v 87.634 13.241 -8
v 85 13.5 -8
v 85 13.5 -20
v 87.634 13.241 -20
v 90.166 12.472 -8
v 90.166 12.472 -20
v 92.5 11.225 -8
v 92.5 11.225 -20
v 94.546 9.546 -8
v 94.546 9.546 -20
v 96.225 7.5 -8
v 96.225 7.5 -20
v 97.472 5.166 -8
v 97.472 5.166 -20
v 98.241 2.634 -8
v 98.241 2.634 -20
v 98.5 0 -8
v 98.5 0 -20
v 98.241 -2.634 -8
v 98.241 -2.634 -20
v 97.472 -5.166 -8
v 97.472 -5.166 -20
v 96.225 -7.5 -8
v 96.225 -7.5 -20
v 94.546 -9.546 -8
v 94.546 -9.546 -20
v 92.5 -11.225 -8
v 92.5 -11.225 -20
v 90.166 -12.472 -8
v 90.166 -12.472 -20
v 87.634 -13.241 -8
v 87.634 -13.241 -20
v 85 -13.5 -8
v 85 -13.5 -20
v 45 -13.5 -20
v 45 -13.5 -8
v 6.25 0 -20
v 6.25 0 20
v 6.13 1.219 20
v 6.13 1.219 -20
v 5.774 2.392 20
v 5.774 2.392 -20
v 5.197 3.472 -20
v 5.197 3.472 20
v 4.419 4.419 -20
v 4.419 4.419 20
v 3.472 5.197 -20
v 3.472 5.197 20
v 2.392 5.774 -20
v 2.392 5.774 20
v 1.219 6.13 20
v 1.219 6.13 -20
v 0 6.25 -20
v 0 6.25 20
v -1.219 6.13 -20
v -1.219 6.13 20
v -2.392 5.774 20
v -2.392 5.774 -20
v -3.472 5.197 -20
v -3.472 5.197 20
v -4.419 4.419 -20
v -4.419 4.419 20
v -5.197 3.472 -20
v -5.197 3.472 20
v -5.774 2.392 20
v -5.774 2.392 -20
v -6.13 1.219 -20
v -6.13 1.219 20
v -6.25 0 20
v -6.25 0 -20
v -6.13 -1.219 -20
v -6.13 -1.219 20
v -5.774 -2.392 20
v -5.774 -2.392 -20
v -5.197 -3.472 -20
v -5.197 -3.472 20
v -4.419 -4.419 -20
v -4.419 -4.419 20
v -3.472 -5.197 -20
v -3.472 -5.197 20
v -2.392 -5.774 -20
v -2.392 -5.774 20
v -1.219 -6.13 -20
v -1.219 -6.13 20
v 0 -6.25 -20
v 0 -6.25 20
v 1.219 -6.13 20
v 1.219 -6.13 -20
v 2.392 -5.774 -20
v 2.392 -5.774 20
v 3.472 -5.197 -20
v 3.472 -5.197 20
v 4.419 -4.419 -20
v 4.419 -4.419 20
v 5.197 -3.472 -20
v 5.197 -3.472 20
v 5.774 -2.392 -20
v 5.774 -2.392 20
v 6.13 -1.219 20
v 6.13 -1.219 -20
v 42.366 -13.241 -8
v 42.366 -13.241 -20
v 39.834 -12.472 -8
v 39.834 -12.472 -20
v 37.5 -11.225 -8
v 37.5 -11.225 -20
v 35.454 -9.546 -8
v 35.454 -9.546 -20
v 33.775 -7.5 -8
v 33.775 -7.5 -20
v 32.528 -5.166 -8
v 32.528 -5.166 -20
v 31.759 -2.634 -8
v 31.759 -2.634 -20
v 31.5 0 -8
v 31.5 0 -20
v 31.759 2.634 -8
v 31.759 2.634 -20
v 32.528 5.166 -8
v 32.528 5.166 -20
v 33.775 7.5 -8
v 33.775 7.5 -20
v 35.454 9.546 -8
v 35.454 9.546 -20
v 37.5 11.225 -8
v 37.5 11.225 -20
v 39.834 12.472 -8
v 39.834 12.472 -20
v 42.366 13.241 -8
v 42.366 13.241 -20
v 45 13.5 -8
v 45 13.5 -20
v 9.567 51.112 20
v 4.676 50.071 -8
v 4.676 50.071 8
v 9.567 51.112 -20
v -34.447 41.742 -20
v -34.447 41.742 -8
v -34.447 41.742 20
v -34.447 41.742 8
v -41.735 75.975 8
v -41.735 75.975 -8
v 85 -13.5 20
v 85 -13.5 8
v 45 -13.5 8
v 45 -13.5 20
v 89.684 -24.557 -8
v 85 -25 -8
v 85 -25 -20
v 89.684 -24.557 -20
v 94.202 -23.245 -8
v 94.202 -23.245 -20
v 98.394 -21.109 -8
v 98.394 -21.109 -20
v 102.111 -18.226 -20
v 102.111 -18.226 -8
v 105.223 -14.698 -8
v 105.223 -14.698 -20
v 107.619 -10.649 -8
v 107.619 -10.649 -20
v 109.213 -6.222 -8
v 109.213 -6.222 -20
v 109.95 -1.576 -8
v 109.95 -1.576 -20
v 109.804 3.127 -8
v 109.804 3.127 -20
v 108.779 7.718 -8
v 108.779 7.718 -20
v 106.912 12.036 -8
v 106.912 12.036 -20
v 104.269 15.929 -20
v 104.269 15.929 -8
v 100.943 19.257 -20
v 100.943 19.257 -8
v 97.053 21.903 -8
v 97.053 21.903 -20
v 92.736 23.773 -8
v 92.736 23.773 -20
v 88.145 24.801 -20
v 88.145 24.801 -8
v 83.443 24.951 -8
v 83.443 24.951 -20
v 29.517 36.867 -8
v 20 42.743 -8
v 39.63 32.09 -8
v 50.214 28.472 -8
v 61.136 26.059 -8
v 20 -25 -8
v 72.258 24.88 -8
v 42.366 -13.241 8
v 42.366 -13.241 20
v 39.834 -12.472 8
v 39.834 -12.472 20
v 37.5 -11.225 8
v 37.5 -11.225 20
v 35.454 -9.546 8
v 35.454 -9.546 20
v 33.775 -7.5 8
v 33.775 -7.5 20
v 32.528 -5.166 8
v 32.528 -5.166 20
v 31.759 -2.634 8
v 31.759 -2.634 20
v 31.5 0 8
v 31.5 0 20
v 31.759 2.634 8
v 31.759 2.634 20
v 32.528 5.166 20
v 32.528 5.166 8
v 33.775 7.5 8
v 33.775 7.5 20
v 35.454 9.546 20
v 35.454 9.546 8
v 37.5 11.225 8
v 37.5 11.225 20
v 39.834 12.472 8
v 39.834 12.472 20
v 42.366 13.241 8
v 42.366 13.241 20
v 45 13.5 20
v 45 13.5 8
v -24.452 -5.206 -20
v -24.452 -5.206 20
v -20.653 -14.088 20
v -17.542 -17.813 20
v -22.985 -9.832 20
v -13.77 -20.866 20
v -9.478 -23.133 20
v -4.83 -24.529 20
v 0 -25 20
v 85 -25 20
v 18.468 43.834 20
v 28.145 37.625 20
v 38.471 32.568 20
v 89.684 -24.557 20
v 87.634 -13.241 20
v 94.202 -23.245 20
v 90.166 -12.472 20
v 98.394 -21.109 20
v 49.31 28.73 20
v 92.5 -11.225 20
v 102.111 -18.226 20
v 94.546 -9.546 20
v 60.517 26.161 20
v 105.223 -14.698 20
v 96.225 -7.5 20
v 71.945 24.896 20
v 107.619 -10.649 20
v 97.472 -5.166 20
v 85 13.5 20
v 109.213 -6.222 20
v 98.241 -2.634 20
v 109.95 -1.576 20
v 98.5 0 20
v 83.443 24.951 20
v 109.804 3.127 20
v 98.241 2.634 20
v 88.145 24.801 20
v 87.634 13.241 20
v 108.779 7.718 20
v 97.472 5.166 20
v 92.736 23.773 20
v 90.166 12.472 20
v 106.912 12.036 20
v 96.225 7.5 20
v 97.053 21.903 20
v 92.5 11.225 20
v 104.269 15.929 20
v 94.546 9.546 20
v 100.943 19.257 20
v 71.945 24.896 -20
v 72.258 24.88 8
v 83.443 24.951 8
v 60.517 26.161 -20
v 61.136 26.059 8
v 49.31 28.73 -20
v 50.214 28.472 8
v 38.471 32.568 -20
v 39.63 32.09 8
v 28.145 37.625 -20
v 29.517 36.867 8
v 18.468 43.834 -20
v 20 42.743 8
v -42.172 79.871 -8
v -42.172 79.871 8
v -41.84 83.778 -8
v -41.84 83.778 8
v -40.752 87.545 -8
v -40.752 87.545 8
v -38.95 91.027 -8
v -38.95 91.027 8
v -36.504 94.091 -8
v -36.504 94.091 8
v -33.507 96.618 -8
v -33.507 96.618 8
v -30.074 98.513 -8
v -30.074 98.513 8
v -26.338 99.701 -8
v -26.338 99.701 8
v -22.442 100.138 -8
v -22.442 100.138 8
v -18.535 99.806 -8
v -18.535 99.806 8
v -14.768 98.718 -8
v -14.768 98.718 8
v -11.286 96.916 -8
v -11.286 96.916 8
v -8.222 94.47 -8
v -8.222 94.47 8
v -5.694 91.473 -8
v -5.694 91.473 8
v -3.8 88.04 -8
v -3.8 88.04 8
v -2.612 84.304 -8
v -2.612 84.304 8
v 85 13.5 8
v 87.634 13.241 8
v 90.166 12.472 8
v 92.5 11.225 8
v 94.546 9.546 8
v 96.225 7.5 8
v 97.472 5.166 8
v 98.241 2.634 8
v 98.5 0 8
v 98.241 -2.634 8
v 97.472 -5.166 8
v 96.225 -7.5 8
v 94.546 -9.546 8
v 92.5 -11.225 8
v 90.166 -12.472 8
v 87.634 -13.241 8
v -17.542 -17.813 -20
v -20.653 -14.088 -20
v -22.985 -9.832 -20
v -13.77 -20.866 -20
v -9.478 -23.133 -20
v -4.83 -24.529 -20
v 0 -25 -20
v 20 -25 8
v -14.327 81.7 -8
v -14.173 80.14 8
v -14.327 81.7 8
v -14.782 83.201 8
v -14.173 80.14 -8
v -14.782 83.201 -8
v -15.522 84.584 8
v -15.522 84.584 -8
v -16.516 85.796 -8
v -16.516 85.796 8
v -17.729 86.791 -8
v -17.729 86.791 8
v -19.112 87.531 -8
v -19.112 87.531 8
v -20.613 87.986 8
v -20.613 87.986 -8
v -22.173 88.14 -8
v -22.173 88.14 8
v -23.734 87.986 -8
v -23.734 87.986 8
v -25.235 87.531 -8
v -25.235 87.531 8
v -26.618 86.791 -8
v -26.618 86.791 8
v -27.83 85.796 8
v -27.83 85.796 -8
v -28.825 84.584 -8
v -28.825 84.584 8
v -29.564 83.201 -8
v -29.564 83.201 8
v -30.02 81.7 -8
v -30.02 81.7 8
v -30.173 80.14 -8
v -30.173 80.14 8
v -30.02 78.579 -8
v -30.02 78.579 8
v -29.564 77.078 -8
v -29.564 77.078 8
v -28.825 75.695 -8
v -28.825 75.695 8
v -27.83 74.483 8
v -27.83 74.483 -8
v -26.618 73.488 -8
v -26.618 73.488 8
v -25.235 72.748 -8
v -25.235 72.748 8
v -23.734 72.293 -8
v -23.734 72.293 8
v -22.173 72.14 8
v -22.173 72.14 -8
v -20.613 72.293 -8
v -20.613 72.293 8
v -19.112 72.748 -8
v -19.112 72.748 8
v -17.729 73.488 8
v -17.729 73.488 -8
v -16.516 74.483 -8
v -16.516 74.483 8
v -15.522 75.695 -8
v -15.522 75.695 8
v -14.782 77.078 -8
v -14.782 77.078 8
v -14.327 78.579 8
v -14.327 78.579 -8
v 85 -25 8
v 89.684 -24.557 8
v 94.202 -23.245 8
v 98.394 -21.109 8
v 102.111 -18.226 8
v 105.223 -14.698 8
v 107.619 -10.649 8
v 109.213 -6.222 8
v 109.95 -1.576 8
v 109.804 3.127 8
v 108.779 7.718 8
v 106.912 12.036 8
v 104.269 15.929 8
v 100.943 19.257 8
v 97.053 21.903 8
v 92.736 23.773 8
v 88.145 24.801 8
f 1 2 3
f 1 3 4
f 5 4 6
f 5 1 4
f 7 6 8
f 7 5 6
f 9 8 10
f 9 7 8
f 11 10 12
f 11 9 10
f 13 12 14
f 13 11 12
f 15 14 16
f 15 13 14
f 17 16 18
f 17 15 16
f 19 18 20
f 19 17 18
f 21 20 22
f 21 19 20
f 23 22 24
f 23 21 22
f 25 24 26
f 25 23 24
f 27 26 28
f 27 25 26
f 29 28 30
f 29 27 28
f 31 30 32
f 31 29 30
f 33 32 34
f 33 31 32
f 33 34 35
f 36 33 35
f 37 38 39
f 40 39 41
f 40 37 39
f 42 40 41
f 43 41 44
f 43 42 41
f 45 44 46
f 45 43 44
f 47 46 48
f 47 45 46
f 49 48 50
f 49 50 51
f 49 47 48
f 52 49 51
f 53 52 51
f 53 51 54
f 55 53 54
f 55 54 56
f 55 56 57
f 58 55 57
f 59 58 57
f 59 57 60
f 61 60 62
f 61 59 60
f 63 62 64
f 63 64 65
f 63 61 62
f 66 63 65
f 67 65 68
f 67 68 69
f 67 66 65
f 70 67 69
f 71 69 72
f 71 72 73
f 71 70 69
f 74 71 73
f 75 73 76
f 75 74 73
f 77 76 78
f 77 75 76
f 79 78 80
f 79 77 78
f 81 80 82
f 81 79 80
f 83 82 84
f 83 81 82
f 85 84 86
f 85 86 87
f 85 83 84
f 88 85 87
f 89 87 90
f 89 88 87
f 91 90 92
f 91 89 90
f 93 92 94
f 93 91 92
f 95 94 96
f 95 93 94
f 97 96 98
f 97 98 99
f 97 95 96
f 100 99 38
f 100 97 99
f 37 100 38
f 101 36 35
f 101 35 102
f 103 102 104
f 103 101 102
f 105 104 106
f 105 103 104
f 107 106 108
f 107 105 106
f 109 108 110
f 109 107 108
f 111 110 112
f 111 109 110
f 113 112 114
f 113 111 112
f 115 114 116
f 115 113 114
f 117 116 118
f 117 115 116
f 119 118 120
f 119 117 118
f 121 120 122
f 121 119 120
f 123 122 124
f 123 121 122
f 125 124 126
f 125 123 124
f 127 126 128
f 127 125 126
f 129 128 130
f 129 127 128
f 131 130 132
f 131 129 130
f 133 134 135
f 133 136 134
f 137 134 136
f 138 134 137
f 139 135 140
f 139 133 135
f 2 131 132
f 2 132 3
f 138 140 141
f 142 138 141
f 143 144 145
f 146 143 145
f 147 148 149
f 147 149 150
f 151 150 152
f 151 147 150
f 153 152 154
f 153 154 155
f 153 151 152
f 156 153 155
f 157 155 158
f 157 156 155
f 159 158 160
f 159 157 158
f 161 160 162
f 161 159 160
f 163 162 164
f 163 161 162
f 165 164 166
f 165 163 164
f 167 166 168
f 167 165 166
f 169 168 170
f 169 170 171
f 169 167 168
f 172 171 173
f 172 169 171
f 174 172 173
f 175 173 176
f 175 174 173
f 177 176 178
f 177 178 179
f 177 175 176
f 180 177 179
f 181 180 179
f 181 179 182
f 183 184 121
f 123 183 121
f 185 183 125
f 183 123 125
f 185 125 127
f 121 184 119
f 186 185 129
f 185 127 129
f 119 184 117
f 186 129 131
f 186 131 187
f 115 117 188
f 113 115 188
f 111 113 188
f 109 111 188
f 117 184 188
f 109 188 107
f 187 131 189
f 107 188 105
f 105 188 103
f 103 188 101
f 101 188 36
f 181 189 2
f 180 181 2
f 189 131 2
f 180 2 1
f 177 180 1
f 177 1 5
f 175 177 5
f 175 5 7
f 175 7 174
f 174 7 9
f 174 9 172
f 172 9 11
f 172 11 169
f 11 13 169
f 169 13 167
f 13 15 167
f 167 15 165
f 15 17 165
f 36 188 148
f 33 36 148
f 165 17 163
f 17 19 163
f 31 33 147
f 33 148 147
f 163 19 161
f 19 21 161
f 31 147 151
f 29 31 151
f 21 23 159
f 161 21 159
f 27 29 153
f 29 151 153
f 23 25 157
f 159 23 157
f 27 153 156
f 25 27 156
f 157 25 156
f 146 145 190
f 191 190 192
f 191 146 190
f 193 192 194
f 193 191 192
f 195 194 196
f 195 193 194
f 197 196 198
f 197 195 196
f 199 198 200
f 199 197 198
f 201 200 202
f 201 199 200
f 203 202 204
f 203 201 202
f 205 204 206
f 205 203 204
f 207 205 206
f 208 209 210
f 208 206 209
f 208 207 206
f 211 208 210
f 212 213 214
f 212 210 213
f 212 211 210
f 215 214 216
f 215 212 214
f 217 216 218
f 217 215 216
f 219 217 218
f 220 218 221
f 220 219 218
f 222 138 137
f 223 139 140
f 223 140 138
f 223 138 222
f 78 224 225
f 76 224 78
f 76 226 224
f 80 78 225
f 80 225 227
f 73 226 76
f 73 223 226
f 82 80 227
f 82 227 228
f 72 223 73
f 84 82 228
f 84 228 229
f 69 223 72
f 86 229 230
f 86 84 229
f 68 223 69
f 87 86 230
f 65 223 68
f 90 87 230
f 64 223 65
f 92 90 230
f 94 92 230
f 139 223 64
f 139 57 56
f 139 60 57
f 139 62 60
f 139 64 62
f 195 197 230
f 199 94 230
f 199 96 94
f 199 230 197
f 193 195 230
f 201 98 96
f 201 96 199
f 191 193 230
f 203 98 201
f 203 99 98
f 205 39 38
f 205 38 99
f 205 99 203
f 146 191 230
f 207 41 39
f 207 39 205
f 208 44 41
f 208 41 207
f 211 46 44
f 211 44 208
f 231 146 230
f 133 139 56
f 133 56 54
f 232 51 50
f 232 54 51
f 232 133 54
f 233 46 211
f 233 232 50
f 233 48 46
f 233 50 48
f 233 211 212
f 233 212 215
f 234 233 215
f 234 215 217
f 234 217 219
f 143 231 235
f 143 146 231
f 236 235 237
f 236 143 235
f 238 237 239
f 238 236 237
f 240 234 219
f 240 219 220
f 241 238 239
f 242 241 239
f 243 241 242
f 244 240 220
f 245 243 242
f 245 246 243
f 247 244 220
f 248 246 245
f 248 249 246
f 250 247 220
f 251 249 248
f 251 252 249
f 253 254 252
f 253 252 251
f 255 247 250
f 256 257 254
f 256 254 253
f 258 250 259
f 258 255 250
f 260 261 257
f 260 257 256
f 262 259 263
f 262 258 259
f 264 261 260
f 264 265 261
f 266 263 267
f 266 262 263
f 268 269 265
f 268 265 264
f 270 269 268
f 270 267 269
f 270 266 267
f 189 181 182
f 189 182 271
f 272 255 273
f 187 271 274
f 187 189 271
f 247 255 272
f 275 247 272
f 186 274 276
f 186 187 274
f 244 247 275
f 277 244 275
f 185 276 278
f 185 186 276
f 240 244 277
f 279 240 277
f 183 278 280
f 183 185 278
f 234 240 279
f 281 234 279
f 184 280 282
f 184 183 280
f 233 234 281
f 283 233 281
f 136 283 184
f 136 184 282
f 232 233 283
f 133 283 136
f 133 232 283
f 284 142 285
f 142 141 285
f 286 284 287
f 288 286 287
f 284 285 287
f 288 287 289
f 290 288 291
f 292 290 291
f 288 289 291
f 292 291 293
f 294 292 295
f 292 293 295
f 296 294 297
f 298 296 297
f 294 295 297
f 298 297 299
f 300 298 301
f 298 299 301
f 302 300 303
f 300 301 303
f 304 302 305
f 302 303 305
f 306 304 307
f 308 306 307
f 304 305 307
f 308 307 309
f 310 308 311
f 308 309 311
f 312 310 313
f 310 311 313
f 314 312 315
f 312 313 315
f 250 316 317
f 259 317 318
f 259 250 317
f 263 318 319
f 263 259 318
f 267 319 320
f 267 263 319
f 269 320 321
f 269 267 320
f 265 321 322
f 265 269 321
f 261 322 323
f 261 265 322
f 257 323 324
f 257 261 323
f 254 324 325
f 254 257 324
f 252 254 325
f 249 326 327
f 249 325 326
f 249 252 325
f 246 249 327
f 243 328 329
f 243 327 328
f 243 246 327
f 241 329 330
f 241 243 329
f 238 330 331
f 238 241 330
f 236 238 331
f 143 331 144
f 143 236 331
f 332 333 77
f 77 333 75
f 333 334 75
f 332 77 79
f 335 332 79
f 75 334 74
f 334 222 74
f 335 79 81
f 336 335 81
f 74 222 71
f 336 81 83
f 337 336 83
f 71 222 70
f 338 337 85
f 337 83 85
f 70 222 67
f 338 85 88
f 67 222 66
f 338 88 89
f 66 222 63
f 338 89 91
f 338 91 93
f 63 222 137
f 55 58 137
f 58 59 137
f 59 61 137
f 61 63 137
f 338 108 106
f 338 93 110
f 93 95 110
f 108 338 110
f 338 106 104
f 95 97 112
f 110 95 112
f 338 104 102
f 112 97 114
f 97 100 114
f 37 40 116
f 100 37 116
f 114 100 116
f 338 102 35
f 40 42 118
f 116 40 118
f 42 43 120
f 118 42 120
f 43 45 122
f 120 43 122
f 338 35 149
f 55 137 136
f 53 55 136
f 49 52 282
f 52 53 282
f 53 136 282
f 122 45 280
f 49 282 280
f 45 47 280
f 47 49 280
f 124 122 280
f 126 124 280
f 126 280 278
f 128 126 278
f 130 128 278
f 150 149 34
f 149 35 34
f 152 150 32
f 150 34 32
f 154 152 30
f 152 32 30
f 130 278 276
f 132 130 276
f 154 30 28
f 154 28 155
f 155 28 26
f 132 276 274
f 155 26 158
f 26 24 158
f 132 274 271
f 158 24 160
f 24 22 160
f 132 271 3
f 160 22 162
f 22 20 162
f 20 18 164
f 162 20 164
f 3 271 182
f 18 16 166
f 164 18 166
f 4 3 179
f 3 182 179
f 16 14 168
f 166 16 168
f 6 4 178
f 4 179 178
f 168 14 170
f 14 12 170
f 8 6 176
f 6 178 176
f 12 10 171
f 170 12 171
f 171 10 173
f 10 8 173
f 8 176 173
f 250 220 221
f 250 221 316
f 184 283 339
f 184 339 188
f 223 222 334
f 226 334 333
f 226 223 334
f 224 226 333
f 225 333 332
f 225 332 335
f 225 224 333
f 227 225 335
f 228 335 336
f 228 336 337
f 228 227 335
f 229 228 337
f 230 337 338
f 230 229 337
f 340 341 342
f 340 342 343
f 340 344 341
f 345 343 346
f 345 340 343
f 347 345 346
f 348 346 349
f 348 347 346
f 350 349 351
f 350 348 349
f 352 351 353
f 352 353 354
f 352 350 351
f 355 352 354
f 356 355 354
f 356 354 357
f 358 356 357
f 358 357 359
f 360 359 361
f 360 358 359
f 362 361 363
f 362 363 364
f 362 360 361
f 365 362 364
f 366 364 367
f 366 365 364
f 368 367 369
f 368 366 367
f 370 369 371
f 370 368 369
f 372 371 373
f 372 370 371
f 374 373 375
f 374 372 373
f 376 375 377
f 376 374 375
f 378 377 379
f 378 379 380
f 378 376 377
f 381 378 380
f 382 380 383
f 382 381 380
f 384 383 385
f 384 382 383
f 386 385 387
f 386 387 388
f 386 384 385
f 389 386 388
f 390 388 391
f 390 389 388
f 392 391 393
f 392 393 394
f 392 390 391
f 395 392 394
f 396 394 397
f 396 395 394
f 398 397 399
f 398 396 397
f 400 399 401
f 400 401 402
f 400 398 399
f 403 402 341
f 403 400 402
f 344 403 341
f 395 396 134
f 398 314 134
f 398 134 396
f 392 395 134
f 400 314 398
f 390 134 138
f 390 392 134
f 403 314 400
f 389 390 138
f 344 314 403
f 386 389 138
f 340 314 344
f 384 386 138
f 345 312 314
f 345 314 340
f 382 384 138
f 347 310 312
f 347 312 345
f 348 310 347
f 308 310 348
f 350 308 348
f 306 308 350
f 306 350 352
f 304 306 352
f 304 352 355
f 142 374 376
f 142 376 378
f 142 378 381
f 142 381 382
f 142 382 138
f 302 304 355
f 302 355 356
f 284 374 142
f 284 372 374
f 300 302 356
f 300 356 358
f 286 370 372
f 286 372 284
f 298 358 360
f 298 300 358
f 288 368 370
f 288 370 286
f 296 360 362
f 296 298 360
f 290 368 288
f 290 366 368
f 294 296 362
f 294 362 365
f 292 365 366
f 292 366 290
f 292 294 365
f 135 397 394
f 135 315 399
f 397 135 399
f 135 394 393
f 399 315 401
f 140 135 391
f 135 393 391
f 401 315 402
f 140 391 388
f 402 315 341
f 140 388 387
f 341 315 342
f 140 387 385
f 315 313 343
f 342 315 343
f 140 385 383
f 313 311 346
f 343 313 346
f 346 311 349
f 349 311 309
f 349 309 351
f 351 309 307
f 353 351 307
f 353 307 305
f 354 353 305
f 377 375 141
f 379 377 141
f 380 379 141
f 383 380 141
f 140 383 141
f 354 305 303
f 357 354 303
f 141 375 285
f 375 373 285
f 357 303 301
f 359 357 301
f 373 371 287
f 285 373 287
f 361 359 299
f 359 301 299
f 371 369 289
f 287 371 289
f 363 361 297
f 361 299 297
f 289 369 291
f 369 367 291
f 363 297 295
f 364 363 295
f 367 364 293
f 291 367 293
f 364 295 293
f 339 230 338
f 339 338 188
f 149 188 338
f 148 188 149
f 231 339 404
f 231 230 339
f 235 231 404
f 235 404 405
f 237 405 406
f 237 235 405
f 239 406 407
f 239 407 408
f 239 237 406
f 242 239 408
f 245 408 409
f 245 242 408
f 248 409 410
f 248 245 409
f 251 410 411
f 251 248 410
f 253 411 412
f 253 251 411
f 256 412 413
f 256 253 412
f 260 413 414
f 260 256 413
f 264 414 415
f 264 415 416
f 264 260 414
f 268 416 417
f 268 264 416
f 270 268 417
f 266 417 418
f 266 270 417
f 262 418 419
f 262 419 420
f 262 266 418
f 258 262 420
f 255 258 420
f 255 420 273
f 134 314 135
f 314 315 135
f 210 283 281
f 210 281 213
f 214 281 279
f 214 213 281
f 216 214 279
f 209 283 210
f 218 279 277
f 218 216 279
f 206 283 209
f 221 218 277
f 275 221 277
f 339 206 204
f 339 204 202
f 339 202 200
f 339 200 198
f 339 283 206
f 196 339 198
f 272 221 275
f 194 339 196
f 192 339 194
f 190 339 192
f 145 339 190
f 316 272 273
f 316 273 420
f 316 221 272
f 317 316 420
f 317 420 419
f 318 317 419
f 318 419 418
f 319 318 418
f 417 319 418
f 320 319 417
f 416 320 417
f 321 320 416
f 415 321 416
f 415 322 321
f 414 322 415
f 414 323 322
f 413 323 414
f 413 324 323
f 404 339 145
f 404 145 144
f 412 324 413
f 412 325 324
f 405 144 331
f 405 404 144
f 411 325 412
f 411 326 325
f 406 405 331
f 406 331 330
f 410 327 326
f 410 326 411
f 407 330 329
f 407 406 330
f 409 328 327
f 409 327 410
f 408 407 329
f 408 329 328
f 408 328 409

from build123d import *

# Parameters (mm, degrees)
SKETCH2_R               = 6.25
BOSS_EXTRUDE1_DEPTH     = 20
CUT_EXTRUDE1_DEPTH      = 123.932823709
CUT_EXTRUDE1_DEPTH_BACK = 123.932823709
SKETCH4_W               = 90
SKETCH4_H               = 16
SKETCH5_R               = 8
BOSS_EXTRUDE2_DEPTH     = 8


with BuildPart() as part:
    # Sketch2 → Boss-Extrude1 (new, symmetric)
    with BuildSketch(Plane.XY):
        with BuildLine():
            Line((0, -25), (85, -25))
            ThreePointArc((85, -25), (109.987866766, 0.7787904), (83.443175141, 24.951478841))
            ThreePointArc((83.443175141, 24.951478841), (43.835315137, 30.493200705), (9.566653282, 51.11241674))
            Line((9.566653282, 51.11241674), (-34.446959185, 41.742148997))
            Line((-34.446959185, 41.742148997), (-24.452006926, -5.205704301))
            ThreePointArc((-24.452006926, -5.205704301), (-15.729866377, -19.43119409), (0, -25))
        make_face()
        Circle(SKETCH2_R, mode=Mode.SUBTRACT)
        with BuildLine():
            Line((85, -13.5), (45, -13.5))
            ThreePointArc((45, -13.5), (31.5, 0), (45, 13.5))
            Line((45, 13.5), (85, 13.5))
            ThreePointArc((85, 13.5), (98.5, 0), (85, -13.5))
        make_face(mode=Mode.SUBTRACT)
    extrude(amount=BOSS_EXTRUDE1_DEPTH, both=True)

    # Sketch4 → Cut-Extrude1 (cut, two sides: drawn at the far end of the back side and taken through both)
    with BuildSketch(Plane(origin=(0, 0, 0), x_dir=(1, 0, 0), z_dir=(0, 1, 0)).offset(-CUT_EXTRUDE1_DEPTH_BACK)):
        with Locations((65, 0)):
            Rectangle(SKETCH4_W, SKETCH4_H)
    extrude(amount=CUT_EXTRUDE1_DEPTH + CUT_EXTRUDE1_DEPTH_BACK, mode=Mode.SUBTRACT)

    # Sketch5 → Boss-Extrude2 (add, symmetric)
    with BuildSketch(Plane.XY):
        with BuildLine():
            Line((-34.446959185, 41.742148997), (-41.734945207, 75.974958694))
            ThreePointArc((-41.734945207, 75.974958694), (-26.337903107, 99.701127676), (-2.611734125, 84.304085576))
            Line((-2.611734125, 84.304085576), (4.676251897, 50.071275879))
            Line((4.676251897, 50.071275879), (-34.446959185, 41.742148997))
        make_face()
        with Locations((-22.173339666, 80.139522135)):
            Circle(SKETCH5_R, mode=Mode.SUBTRACT)
    extrude(amount=BOSS_EXTRUDE2_DEPTH, both=True)


solid = part.part
